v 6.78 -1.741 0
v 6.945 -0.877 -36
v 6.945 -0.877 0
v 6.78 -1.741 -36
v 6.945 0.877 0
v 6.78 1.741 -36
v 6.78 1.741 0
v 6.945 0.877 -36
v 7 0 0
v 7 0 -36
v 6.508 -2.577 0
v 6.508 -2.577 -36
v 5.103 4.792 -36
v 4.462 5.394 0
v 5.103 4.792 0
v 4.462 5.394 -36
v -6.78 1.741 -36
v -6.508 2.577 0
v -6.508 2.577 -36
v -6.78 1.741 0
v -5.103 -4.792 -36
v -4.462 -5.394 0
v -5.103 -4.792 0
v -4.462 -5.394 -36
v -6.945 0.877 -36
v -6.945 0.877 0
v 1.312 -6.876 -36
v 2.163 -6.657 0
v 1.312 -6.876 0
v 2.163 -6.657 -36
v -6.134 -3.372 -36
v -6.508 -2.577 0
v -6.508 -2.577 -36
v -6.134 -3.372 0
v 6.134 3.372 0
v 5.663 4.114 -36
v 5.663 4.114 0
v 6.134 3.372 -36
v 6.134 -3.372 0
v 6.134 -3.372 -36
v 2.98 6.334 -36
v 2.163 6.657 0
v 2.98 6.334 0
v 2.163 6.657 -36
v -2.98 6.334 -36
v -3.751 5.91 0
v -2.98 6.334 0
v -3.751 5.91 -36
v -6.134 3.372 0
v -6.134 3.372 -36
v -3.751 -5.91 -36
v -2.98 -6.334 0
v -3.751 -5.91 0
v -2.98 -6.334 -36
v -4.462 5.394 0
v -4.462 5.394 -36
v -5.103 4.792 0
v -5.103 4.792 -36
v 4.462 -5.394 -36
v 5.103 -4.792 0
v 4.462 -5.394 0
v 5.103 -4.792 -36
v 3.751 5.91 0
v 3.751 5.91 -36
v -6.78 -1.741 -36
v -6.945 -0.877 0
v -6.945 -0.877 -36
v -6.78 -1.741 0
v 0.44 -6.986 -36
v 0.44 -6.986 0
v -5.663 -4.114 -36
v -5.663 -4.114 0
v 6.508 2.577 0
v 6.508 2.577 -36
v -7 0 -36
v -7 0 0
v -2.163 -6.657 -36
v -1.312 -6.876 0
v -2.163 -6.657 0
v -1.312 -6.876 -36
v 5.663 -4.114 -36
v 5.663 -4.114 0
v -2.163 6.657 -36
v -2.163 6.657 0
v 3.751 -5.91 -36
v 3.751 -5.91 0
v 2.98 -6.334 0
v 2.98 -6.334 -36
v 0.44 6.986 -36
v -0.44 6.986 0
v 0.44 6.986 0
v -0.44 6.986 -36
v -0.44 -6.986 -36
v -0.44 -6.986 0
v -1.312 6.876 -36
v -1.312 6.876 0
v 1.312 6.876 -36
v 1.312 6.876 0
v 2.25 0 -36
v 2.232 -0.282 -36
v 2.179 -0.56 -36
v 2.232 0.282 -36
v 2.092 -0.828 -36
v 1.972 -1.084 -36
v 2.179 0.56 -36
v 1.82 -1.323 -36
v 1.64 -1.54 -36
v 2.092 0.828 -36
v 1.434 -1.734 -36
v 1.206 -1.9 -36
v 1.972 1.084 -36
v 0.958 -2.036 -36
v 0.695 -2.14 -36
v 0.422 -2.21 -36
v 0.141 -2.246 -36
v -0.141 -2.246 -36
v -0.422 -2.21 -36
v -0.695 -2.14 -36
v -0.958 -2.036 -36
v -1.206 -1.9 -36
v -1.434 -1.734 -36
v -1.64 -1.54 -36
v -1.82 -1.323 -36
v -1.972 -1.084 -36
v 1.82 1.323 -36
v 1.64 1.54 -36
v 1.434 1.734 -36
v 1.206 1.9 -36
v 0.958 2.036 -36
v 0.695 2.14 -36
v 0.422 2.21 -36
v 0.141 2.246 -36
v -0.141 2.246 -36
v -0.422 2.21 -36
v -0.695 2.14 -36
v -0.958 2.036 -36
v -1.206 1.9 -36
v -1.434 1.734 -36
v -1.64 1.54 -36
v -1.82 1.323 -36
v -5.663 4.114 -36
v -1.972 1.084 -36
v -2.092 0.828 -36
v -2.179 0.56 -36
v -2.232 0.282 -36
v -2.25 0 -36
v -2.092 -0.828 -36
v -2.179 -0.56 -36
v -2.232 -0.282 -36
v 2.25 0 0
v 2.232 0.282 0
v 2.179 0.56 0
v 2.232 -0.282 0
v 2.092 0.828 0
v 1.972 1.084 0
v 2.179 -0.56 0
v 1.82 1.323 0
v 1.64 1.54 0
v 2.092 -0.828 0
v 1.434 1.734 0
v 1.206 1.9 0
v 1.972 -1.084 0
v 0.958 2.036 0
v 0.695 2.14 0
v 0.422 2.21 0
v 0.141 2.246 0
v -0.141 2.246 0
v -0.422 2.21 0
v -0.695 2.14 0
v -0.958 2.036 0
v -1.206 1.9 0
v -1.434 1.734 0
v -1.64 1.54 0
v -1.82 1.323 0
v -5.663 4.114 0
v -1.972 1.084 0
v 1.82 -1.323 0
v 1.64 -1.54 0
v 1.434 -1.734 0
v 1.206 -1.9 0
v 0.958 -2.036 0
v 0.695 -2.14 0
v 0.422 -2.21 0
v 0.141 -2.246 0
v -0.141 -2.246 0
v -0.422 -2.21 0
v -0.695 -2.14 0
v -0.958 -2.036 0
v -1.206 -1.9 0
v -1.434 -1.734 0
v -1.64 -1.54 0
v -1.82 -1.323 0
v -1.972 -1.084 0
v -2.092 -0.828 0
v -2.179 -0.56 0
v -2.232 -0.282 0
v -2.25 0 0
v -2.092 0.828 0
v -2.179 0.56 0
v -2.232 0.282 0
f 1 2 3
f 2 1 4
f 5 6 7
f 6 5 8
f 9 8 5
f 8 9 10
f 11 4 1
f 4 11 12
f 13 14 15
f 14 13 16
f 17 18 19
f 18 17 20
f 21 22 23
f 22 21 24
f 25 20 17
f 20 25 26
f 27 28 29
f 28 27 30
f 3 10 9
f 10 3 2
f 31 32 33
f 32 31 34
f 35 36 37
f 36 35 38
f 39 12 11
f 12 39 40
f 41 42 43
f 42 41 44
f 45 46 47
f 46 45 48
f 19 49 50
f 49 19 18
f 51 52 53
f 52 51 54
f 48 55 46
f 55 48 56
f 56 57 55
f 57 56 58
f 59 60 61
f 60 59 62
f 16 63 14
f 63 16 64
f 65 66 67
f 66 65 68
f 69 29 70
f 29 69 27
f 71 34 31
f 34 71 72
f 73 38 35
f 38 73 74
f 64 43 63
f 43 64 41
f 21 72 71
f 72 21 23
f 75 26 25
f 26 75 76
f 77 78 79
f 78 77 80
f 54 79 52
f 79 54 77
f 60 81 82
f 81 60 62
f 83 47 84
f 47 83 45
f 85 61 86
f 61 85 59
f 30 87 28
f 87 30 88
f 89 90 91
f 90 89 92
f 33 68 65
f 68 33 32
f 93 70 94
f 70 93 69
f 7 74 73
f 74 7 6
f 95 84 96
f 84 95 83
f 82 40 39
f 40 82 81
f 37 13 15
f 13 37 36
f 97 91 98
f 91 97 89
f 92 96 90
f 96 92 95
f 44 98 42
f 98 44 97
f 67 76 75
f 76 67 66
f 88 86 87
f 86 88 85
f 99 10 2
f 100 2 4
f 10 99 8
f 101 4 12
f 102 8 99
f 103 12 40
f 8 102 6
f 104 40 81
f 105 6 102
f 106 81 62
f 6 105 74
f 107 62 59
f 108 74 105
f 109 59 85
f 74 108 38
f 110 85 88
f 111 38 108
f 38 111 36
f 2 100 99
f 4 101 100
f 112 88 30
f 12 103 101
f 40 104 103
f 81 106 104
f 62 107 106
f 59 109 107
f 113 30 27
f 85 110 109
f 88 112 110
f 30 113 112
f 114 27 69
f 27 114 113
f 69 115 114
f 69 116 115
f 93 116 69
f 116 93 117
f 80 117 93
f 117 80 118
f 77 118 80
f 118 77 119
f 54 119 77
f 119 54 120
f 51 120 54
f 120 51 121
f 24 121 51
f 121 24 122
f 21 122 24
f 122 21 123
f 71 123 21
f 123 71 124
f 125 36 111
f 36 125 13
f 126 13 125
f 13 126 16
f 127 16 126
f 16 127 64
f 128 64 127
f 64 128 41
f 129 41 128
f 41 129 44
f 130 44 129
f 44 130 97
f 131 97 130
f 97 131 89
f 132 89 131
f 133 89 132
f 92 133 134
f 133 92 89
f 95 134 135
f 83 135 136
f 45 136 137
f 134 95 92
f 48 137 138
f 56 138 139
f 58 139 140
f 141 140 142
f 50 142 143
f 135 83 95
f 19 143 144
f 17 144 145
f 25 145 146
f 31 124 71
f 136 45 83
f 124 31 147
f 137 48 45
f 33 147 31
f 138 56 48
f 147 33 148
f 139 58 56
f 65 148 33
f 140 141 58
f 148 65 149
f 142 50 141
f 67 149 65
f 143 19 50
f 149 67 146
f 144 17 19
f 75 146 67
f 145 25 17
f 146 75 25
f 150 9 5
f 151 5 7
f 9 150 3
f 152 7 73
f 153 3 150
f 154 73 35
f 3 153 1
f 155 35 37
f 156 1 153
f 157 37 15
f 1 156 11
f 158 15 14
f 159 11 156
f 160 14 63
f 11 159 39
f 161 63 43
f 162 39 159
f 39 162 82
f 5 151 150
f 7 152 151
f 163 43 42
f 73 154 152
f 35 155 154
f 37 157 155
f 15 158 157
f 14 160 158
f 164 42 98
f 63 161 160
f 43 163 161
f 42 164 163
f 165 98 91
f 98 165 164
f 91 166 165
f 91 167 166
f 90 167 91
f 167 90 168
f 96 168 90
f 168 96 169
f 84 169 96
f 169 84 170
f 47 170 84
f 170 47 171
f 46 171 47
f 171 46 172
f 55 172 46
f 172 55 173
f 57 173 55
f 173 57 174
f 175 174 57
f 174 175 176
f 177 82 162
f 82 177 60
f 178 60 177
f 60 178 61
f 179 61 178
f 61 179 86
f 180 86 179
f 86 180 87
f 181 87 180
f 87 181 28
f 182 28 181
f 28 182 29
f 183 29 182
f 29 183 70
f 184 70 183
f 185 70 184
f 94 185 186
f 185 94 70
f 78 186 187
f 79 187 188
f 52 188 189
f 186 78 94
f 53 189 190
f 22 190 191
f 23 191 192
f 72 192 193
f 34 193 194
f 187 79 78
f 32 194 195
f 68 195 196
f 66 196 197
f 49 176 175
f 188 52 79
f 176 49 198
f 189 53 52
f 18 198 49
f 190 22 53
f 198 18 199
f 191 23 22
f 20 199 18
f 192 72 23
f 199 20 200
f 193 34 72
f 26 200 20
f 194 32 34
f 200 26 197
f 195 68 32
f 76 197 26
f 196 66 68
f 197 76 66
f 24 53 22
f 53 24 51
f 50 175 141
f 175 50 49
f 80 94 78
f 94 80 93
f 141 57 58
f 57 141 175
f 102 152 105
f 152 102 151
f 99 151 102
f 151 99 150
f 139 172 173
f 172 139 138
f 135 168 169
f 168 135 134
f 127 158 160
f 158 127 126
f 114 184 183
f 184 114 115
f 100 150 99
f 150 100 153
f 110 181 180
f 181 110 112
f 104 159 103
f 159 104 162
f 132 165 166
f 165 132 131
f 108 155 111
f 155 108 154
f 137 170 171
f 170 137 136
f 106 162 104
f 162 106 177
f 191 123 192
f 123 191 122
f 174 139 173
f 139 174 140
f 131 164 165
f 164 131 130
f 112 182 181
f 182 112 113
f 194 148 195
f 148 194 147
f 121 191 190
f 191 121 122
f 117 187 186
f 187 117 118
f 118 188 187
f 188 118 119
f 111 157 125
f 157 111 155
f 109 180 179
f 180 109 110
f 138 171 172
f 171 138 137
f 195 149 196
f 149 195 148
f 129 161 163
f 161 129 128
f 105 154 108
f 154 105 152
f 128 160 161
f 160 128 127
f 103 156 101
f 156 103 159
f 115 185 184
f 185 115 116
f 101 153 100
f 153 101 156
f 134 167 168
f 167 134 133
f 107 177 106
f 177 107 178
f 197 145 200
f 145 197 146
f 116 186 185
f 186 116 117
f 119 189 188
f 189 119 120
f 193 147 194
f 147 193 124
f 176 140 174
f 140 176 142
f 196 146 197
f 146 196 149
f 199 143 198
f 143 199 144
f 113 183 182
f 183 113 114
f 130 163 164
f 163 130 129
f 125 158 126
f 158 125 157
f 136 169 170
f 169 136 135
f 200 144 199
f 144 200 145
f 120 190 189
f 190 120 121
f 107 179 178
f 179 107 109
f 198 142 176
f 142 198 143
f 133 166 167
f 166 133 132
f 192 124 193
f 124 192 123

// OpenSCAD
$fn = 50;


difference() {
	union() {
		translate(v = [0, 0, -36.0000000000]) {
			cylinder(h = 36, r = 7.0000000000);
		}
	}
	union() {
		#translate(v = [0, 0, -36]) {
			cylinder(h = 36, r = 2.2500000000);
		}
	}
}
